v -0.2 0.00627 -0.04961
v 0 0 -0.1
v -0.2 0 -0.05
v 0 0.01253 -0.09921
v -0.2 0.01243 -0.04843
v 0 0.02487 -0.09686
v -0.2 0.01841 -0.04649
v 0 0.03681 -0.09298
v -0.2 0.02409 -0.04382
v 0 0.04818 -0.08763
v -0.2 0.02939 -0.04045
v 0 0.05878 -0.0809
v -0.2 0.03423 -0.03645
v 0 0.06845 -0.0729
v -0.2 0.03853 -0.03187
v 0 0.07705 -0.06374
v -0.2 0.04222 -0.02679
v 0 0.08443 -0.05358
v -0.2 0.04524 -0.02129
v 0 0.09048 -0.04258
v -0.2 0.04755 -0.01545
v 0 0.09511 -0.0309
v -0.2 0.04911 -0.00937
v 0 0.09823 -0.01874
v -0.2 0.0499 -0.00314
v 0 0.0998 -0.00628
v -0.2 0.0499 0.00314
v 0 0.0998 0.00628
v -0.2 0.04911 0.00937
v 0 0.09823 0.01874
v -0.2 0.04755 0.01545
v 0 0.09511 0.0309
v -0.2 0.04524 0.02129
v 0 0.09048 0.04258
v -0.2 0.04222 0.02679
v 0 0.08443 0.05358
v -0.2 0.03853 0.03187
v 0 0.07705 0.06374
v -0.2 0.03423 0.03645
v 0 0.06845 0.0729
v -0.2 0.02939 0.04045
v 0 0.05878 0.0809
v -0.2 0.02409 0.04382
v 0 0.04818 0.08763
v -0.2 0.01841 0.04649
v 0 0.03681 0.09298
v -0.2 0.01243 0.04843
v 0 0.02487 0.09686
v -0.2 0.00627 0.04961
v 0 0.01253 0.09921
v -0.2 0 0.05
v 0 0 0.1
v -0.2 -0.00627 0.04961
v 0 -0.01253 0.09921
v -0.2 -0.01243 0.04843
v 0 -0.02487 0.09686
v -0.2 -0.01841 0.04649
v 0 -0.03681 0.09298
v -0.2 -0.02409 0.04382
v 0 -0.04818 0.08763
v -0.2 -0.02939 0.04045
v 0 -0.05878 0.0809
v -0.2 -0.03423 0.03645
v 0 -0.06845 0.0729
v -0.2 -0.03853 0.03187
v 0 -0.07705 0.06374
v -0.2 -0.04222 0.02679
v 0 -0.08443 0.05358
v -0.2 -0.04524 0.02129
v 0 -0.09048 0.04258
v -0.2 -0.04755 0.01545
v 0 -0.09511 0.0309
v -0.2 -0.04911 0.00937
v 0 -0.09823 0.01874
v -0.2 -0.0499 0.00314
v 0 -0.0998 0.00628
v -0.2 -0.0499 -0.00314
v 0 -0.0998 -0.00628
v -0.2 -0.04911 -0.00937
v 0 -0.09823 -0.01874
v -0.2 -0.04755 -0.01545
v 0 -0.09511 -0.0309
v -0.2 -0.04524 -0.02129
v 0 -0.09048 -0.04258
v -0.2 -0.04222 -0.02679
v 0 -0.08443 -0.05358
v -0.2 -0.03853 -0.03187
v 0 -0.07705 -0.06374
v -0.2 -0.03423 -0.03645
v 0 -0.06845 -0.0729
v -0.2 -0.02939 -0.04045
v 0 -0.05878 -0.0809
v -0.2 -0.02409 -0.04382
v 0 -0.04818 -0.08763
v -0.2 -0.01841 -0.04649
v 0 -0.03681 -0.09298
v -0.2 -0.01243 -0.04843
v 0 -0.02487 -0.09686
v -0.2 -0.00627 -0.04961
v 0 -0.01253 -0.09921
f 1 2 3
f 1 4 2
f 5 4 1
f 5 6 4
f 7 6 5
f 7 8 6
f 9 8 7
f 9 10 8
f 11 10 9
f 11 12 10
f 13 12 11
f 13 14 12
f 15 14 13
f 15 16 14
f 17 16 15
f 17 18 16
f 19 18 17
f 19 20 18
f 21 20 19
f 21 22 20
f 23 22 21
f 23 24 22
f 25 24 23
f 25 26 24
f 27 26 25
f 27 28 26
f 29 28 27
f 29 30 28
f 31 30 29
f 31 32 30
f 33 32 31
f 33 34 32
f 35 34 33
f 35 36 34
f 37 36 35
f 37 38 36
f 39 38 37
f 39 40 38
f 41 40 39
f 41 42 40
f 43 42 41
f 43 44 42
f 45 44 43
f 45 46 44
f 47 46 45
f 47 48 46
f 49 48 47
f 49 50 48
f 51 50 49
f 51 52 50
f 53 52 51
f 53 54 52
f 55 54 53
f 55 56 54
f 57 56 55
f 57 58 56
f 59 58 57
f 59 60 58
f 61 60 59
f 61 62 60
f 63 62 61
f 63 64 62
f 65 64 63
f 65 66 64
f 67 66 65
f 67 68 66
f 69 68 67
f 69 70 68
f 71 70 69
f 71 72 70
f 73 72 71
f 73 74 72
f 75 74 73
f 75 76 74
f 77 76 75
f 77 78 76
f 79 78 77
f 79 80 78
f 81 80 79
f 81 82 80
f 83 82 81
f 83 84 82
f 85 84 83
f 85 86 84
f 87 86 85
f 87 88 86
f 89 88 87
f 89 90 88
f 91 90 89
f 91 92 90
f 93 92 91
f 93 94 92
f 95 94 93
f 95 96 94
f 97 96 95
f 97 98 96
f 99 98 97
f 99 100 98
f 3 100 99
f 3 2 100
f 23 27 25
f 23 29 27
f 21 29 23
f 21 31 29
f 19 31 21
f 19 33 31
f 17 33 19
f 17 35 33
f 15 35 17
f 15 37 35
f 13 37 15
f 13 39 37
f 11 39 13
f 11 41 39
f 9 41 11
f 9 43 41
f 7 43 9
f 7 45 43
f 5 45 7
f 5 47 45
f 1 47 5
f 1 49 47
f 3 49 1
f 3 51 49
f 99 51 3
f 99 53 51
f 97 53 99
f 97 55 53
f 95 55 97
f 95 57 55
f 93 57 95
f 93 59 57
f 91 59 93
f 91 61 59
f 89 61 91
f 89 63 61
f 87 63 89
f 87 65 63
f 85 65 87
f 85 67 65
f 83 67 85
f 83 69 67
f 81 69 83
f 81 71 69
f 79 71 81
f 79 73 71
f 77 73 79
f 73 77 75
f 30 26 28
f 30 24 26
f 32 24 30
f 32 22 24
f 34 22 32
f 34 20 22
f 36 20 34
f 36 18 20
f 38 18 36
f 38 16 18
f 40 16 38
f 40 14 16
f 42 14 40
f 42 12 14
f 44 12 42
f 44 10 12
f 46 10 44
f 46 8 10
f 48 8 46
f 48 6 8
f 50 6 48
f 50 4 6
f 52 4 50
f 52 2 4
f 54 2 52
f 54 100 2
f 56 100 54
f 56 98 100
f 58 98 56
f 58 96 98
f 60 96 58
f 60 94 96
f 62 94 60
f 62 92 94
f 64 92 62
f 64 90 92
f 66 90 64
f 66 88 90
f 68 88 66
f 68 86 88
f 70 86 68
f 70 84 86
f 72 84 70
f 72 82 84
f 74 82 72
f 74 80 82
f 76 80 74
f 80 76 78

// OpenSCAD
$fn=50;  // REMOVE
LENGTH = 1;  // REMOVE
DO = 0.1; // REMOVE
PARAM1 = 0.2; // REMOVE
rotate([0, 90, 0])
translate([0, 0, -(PARAM1)/2])
cylinder(h = (PARAM1), r1 = (DO)/2, r2 = (PARAM1)/2, center = true);
